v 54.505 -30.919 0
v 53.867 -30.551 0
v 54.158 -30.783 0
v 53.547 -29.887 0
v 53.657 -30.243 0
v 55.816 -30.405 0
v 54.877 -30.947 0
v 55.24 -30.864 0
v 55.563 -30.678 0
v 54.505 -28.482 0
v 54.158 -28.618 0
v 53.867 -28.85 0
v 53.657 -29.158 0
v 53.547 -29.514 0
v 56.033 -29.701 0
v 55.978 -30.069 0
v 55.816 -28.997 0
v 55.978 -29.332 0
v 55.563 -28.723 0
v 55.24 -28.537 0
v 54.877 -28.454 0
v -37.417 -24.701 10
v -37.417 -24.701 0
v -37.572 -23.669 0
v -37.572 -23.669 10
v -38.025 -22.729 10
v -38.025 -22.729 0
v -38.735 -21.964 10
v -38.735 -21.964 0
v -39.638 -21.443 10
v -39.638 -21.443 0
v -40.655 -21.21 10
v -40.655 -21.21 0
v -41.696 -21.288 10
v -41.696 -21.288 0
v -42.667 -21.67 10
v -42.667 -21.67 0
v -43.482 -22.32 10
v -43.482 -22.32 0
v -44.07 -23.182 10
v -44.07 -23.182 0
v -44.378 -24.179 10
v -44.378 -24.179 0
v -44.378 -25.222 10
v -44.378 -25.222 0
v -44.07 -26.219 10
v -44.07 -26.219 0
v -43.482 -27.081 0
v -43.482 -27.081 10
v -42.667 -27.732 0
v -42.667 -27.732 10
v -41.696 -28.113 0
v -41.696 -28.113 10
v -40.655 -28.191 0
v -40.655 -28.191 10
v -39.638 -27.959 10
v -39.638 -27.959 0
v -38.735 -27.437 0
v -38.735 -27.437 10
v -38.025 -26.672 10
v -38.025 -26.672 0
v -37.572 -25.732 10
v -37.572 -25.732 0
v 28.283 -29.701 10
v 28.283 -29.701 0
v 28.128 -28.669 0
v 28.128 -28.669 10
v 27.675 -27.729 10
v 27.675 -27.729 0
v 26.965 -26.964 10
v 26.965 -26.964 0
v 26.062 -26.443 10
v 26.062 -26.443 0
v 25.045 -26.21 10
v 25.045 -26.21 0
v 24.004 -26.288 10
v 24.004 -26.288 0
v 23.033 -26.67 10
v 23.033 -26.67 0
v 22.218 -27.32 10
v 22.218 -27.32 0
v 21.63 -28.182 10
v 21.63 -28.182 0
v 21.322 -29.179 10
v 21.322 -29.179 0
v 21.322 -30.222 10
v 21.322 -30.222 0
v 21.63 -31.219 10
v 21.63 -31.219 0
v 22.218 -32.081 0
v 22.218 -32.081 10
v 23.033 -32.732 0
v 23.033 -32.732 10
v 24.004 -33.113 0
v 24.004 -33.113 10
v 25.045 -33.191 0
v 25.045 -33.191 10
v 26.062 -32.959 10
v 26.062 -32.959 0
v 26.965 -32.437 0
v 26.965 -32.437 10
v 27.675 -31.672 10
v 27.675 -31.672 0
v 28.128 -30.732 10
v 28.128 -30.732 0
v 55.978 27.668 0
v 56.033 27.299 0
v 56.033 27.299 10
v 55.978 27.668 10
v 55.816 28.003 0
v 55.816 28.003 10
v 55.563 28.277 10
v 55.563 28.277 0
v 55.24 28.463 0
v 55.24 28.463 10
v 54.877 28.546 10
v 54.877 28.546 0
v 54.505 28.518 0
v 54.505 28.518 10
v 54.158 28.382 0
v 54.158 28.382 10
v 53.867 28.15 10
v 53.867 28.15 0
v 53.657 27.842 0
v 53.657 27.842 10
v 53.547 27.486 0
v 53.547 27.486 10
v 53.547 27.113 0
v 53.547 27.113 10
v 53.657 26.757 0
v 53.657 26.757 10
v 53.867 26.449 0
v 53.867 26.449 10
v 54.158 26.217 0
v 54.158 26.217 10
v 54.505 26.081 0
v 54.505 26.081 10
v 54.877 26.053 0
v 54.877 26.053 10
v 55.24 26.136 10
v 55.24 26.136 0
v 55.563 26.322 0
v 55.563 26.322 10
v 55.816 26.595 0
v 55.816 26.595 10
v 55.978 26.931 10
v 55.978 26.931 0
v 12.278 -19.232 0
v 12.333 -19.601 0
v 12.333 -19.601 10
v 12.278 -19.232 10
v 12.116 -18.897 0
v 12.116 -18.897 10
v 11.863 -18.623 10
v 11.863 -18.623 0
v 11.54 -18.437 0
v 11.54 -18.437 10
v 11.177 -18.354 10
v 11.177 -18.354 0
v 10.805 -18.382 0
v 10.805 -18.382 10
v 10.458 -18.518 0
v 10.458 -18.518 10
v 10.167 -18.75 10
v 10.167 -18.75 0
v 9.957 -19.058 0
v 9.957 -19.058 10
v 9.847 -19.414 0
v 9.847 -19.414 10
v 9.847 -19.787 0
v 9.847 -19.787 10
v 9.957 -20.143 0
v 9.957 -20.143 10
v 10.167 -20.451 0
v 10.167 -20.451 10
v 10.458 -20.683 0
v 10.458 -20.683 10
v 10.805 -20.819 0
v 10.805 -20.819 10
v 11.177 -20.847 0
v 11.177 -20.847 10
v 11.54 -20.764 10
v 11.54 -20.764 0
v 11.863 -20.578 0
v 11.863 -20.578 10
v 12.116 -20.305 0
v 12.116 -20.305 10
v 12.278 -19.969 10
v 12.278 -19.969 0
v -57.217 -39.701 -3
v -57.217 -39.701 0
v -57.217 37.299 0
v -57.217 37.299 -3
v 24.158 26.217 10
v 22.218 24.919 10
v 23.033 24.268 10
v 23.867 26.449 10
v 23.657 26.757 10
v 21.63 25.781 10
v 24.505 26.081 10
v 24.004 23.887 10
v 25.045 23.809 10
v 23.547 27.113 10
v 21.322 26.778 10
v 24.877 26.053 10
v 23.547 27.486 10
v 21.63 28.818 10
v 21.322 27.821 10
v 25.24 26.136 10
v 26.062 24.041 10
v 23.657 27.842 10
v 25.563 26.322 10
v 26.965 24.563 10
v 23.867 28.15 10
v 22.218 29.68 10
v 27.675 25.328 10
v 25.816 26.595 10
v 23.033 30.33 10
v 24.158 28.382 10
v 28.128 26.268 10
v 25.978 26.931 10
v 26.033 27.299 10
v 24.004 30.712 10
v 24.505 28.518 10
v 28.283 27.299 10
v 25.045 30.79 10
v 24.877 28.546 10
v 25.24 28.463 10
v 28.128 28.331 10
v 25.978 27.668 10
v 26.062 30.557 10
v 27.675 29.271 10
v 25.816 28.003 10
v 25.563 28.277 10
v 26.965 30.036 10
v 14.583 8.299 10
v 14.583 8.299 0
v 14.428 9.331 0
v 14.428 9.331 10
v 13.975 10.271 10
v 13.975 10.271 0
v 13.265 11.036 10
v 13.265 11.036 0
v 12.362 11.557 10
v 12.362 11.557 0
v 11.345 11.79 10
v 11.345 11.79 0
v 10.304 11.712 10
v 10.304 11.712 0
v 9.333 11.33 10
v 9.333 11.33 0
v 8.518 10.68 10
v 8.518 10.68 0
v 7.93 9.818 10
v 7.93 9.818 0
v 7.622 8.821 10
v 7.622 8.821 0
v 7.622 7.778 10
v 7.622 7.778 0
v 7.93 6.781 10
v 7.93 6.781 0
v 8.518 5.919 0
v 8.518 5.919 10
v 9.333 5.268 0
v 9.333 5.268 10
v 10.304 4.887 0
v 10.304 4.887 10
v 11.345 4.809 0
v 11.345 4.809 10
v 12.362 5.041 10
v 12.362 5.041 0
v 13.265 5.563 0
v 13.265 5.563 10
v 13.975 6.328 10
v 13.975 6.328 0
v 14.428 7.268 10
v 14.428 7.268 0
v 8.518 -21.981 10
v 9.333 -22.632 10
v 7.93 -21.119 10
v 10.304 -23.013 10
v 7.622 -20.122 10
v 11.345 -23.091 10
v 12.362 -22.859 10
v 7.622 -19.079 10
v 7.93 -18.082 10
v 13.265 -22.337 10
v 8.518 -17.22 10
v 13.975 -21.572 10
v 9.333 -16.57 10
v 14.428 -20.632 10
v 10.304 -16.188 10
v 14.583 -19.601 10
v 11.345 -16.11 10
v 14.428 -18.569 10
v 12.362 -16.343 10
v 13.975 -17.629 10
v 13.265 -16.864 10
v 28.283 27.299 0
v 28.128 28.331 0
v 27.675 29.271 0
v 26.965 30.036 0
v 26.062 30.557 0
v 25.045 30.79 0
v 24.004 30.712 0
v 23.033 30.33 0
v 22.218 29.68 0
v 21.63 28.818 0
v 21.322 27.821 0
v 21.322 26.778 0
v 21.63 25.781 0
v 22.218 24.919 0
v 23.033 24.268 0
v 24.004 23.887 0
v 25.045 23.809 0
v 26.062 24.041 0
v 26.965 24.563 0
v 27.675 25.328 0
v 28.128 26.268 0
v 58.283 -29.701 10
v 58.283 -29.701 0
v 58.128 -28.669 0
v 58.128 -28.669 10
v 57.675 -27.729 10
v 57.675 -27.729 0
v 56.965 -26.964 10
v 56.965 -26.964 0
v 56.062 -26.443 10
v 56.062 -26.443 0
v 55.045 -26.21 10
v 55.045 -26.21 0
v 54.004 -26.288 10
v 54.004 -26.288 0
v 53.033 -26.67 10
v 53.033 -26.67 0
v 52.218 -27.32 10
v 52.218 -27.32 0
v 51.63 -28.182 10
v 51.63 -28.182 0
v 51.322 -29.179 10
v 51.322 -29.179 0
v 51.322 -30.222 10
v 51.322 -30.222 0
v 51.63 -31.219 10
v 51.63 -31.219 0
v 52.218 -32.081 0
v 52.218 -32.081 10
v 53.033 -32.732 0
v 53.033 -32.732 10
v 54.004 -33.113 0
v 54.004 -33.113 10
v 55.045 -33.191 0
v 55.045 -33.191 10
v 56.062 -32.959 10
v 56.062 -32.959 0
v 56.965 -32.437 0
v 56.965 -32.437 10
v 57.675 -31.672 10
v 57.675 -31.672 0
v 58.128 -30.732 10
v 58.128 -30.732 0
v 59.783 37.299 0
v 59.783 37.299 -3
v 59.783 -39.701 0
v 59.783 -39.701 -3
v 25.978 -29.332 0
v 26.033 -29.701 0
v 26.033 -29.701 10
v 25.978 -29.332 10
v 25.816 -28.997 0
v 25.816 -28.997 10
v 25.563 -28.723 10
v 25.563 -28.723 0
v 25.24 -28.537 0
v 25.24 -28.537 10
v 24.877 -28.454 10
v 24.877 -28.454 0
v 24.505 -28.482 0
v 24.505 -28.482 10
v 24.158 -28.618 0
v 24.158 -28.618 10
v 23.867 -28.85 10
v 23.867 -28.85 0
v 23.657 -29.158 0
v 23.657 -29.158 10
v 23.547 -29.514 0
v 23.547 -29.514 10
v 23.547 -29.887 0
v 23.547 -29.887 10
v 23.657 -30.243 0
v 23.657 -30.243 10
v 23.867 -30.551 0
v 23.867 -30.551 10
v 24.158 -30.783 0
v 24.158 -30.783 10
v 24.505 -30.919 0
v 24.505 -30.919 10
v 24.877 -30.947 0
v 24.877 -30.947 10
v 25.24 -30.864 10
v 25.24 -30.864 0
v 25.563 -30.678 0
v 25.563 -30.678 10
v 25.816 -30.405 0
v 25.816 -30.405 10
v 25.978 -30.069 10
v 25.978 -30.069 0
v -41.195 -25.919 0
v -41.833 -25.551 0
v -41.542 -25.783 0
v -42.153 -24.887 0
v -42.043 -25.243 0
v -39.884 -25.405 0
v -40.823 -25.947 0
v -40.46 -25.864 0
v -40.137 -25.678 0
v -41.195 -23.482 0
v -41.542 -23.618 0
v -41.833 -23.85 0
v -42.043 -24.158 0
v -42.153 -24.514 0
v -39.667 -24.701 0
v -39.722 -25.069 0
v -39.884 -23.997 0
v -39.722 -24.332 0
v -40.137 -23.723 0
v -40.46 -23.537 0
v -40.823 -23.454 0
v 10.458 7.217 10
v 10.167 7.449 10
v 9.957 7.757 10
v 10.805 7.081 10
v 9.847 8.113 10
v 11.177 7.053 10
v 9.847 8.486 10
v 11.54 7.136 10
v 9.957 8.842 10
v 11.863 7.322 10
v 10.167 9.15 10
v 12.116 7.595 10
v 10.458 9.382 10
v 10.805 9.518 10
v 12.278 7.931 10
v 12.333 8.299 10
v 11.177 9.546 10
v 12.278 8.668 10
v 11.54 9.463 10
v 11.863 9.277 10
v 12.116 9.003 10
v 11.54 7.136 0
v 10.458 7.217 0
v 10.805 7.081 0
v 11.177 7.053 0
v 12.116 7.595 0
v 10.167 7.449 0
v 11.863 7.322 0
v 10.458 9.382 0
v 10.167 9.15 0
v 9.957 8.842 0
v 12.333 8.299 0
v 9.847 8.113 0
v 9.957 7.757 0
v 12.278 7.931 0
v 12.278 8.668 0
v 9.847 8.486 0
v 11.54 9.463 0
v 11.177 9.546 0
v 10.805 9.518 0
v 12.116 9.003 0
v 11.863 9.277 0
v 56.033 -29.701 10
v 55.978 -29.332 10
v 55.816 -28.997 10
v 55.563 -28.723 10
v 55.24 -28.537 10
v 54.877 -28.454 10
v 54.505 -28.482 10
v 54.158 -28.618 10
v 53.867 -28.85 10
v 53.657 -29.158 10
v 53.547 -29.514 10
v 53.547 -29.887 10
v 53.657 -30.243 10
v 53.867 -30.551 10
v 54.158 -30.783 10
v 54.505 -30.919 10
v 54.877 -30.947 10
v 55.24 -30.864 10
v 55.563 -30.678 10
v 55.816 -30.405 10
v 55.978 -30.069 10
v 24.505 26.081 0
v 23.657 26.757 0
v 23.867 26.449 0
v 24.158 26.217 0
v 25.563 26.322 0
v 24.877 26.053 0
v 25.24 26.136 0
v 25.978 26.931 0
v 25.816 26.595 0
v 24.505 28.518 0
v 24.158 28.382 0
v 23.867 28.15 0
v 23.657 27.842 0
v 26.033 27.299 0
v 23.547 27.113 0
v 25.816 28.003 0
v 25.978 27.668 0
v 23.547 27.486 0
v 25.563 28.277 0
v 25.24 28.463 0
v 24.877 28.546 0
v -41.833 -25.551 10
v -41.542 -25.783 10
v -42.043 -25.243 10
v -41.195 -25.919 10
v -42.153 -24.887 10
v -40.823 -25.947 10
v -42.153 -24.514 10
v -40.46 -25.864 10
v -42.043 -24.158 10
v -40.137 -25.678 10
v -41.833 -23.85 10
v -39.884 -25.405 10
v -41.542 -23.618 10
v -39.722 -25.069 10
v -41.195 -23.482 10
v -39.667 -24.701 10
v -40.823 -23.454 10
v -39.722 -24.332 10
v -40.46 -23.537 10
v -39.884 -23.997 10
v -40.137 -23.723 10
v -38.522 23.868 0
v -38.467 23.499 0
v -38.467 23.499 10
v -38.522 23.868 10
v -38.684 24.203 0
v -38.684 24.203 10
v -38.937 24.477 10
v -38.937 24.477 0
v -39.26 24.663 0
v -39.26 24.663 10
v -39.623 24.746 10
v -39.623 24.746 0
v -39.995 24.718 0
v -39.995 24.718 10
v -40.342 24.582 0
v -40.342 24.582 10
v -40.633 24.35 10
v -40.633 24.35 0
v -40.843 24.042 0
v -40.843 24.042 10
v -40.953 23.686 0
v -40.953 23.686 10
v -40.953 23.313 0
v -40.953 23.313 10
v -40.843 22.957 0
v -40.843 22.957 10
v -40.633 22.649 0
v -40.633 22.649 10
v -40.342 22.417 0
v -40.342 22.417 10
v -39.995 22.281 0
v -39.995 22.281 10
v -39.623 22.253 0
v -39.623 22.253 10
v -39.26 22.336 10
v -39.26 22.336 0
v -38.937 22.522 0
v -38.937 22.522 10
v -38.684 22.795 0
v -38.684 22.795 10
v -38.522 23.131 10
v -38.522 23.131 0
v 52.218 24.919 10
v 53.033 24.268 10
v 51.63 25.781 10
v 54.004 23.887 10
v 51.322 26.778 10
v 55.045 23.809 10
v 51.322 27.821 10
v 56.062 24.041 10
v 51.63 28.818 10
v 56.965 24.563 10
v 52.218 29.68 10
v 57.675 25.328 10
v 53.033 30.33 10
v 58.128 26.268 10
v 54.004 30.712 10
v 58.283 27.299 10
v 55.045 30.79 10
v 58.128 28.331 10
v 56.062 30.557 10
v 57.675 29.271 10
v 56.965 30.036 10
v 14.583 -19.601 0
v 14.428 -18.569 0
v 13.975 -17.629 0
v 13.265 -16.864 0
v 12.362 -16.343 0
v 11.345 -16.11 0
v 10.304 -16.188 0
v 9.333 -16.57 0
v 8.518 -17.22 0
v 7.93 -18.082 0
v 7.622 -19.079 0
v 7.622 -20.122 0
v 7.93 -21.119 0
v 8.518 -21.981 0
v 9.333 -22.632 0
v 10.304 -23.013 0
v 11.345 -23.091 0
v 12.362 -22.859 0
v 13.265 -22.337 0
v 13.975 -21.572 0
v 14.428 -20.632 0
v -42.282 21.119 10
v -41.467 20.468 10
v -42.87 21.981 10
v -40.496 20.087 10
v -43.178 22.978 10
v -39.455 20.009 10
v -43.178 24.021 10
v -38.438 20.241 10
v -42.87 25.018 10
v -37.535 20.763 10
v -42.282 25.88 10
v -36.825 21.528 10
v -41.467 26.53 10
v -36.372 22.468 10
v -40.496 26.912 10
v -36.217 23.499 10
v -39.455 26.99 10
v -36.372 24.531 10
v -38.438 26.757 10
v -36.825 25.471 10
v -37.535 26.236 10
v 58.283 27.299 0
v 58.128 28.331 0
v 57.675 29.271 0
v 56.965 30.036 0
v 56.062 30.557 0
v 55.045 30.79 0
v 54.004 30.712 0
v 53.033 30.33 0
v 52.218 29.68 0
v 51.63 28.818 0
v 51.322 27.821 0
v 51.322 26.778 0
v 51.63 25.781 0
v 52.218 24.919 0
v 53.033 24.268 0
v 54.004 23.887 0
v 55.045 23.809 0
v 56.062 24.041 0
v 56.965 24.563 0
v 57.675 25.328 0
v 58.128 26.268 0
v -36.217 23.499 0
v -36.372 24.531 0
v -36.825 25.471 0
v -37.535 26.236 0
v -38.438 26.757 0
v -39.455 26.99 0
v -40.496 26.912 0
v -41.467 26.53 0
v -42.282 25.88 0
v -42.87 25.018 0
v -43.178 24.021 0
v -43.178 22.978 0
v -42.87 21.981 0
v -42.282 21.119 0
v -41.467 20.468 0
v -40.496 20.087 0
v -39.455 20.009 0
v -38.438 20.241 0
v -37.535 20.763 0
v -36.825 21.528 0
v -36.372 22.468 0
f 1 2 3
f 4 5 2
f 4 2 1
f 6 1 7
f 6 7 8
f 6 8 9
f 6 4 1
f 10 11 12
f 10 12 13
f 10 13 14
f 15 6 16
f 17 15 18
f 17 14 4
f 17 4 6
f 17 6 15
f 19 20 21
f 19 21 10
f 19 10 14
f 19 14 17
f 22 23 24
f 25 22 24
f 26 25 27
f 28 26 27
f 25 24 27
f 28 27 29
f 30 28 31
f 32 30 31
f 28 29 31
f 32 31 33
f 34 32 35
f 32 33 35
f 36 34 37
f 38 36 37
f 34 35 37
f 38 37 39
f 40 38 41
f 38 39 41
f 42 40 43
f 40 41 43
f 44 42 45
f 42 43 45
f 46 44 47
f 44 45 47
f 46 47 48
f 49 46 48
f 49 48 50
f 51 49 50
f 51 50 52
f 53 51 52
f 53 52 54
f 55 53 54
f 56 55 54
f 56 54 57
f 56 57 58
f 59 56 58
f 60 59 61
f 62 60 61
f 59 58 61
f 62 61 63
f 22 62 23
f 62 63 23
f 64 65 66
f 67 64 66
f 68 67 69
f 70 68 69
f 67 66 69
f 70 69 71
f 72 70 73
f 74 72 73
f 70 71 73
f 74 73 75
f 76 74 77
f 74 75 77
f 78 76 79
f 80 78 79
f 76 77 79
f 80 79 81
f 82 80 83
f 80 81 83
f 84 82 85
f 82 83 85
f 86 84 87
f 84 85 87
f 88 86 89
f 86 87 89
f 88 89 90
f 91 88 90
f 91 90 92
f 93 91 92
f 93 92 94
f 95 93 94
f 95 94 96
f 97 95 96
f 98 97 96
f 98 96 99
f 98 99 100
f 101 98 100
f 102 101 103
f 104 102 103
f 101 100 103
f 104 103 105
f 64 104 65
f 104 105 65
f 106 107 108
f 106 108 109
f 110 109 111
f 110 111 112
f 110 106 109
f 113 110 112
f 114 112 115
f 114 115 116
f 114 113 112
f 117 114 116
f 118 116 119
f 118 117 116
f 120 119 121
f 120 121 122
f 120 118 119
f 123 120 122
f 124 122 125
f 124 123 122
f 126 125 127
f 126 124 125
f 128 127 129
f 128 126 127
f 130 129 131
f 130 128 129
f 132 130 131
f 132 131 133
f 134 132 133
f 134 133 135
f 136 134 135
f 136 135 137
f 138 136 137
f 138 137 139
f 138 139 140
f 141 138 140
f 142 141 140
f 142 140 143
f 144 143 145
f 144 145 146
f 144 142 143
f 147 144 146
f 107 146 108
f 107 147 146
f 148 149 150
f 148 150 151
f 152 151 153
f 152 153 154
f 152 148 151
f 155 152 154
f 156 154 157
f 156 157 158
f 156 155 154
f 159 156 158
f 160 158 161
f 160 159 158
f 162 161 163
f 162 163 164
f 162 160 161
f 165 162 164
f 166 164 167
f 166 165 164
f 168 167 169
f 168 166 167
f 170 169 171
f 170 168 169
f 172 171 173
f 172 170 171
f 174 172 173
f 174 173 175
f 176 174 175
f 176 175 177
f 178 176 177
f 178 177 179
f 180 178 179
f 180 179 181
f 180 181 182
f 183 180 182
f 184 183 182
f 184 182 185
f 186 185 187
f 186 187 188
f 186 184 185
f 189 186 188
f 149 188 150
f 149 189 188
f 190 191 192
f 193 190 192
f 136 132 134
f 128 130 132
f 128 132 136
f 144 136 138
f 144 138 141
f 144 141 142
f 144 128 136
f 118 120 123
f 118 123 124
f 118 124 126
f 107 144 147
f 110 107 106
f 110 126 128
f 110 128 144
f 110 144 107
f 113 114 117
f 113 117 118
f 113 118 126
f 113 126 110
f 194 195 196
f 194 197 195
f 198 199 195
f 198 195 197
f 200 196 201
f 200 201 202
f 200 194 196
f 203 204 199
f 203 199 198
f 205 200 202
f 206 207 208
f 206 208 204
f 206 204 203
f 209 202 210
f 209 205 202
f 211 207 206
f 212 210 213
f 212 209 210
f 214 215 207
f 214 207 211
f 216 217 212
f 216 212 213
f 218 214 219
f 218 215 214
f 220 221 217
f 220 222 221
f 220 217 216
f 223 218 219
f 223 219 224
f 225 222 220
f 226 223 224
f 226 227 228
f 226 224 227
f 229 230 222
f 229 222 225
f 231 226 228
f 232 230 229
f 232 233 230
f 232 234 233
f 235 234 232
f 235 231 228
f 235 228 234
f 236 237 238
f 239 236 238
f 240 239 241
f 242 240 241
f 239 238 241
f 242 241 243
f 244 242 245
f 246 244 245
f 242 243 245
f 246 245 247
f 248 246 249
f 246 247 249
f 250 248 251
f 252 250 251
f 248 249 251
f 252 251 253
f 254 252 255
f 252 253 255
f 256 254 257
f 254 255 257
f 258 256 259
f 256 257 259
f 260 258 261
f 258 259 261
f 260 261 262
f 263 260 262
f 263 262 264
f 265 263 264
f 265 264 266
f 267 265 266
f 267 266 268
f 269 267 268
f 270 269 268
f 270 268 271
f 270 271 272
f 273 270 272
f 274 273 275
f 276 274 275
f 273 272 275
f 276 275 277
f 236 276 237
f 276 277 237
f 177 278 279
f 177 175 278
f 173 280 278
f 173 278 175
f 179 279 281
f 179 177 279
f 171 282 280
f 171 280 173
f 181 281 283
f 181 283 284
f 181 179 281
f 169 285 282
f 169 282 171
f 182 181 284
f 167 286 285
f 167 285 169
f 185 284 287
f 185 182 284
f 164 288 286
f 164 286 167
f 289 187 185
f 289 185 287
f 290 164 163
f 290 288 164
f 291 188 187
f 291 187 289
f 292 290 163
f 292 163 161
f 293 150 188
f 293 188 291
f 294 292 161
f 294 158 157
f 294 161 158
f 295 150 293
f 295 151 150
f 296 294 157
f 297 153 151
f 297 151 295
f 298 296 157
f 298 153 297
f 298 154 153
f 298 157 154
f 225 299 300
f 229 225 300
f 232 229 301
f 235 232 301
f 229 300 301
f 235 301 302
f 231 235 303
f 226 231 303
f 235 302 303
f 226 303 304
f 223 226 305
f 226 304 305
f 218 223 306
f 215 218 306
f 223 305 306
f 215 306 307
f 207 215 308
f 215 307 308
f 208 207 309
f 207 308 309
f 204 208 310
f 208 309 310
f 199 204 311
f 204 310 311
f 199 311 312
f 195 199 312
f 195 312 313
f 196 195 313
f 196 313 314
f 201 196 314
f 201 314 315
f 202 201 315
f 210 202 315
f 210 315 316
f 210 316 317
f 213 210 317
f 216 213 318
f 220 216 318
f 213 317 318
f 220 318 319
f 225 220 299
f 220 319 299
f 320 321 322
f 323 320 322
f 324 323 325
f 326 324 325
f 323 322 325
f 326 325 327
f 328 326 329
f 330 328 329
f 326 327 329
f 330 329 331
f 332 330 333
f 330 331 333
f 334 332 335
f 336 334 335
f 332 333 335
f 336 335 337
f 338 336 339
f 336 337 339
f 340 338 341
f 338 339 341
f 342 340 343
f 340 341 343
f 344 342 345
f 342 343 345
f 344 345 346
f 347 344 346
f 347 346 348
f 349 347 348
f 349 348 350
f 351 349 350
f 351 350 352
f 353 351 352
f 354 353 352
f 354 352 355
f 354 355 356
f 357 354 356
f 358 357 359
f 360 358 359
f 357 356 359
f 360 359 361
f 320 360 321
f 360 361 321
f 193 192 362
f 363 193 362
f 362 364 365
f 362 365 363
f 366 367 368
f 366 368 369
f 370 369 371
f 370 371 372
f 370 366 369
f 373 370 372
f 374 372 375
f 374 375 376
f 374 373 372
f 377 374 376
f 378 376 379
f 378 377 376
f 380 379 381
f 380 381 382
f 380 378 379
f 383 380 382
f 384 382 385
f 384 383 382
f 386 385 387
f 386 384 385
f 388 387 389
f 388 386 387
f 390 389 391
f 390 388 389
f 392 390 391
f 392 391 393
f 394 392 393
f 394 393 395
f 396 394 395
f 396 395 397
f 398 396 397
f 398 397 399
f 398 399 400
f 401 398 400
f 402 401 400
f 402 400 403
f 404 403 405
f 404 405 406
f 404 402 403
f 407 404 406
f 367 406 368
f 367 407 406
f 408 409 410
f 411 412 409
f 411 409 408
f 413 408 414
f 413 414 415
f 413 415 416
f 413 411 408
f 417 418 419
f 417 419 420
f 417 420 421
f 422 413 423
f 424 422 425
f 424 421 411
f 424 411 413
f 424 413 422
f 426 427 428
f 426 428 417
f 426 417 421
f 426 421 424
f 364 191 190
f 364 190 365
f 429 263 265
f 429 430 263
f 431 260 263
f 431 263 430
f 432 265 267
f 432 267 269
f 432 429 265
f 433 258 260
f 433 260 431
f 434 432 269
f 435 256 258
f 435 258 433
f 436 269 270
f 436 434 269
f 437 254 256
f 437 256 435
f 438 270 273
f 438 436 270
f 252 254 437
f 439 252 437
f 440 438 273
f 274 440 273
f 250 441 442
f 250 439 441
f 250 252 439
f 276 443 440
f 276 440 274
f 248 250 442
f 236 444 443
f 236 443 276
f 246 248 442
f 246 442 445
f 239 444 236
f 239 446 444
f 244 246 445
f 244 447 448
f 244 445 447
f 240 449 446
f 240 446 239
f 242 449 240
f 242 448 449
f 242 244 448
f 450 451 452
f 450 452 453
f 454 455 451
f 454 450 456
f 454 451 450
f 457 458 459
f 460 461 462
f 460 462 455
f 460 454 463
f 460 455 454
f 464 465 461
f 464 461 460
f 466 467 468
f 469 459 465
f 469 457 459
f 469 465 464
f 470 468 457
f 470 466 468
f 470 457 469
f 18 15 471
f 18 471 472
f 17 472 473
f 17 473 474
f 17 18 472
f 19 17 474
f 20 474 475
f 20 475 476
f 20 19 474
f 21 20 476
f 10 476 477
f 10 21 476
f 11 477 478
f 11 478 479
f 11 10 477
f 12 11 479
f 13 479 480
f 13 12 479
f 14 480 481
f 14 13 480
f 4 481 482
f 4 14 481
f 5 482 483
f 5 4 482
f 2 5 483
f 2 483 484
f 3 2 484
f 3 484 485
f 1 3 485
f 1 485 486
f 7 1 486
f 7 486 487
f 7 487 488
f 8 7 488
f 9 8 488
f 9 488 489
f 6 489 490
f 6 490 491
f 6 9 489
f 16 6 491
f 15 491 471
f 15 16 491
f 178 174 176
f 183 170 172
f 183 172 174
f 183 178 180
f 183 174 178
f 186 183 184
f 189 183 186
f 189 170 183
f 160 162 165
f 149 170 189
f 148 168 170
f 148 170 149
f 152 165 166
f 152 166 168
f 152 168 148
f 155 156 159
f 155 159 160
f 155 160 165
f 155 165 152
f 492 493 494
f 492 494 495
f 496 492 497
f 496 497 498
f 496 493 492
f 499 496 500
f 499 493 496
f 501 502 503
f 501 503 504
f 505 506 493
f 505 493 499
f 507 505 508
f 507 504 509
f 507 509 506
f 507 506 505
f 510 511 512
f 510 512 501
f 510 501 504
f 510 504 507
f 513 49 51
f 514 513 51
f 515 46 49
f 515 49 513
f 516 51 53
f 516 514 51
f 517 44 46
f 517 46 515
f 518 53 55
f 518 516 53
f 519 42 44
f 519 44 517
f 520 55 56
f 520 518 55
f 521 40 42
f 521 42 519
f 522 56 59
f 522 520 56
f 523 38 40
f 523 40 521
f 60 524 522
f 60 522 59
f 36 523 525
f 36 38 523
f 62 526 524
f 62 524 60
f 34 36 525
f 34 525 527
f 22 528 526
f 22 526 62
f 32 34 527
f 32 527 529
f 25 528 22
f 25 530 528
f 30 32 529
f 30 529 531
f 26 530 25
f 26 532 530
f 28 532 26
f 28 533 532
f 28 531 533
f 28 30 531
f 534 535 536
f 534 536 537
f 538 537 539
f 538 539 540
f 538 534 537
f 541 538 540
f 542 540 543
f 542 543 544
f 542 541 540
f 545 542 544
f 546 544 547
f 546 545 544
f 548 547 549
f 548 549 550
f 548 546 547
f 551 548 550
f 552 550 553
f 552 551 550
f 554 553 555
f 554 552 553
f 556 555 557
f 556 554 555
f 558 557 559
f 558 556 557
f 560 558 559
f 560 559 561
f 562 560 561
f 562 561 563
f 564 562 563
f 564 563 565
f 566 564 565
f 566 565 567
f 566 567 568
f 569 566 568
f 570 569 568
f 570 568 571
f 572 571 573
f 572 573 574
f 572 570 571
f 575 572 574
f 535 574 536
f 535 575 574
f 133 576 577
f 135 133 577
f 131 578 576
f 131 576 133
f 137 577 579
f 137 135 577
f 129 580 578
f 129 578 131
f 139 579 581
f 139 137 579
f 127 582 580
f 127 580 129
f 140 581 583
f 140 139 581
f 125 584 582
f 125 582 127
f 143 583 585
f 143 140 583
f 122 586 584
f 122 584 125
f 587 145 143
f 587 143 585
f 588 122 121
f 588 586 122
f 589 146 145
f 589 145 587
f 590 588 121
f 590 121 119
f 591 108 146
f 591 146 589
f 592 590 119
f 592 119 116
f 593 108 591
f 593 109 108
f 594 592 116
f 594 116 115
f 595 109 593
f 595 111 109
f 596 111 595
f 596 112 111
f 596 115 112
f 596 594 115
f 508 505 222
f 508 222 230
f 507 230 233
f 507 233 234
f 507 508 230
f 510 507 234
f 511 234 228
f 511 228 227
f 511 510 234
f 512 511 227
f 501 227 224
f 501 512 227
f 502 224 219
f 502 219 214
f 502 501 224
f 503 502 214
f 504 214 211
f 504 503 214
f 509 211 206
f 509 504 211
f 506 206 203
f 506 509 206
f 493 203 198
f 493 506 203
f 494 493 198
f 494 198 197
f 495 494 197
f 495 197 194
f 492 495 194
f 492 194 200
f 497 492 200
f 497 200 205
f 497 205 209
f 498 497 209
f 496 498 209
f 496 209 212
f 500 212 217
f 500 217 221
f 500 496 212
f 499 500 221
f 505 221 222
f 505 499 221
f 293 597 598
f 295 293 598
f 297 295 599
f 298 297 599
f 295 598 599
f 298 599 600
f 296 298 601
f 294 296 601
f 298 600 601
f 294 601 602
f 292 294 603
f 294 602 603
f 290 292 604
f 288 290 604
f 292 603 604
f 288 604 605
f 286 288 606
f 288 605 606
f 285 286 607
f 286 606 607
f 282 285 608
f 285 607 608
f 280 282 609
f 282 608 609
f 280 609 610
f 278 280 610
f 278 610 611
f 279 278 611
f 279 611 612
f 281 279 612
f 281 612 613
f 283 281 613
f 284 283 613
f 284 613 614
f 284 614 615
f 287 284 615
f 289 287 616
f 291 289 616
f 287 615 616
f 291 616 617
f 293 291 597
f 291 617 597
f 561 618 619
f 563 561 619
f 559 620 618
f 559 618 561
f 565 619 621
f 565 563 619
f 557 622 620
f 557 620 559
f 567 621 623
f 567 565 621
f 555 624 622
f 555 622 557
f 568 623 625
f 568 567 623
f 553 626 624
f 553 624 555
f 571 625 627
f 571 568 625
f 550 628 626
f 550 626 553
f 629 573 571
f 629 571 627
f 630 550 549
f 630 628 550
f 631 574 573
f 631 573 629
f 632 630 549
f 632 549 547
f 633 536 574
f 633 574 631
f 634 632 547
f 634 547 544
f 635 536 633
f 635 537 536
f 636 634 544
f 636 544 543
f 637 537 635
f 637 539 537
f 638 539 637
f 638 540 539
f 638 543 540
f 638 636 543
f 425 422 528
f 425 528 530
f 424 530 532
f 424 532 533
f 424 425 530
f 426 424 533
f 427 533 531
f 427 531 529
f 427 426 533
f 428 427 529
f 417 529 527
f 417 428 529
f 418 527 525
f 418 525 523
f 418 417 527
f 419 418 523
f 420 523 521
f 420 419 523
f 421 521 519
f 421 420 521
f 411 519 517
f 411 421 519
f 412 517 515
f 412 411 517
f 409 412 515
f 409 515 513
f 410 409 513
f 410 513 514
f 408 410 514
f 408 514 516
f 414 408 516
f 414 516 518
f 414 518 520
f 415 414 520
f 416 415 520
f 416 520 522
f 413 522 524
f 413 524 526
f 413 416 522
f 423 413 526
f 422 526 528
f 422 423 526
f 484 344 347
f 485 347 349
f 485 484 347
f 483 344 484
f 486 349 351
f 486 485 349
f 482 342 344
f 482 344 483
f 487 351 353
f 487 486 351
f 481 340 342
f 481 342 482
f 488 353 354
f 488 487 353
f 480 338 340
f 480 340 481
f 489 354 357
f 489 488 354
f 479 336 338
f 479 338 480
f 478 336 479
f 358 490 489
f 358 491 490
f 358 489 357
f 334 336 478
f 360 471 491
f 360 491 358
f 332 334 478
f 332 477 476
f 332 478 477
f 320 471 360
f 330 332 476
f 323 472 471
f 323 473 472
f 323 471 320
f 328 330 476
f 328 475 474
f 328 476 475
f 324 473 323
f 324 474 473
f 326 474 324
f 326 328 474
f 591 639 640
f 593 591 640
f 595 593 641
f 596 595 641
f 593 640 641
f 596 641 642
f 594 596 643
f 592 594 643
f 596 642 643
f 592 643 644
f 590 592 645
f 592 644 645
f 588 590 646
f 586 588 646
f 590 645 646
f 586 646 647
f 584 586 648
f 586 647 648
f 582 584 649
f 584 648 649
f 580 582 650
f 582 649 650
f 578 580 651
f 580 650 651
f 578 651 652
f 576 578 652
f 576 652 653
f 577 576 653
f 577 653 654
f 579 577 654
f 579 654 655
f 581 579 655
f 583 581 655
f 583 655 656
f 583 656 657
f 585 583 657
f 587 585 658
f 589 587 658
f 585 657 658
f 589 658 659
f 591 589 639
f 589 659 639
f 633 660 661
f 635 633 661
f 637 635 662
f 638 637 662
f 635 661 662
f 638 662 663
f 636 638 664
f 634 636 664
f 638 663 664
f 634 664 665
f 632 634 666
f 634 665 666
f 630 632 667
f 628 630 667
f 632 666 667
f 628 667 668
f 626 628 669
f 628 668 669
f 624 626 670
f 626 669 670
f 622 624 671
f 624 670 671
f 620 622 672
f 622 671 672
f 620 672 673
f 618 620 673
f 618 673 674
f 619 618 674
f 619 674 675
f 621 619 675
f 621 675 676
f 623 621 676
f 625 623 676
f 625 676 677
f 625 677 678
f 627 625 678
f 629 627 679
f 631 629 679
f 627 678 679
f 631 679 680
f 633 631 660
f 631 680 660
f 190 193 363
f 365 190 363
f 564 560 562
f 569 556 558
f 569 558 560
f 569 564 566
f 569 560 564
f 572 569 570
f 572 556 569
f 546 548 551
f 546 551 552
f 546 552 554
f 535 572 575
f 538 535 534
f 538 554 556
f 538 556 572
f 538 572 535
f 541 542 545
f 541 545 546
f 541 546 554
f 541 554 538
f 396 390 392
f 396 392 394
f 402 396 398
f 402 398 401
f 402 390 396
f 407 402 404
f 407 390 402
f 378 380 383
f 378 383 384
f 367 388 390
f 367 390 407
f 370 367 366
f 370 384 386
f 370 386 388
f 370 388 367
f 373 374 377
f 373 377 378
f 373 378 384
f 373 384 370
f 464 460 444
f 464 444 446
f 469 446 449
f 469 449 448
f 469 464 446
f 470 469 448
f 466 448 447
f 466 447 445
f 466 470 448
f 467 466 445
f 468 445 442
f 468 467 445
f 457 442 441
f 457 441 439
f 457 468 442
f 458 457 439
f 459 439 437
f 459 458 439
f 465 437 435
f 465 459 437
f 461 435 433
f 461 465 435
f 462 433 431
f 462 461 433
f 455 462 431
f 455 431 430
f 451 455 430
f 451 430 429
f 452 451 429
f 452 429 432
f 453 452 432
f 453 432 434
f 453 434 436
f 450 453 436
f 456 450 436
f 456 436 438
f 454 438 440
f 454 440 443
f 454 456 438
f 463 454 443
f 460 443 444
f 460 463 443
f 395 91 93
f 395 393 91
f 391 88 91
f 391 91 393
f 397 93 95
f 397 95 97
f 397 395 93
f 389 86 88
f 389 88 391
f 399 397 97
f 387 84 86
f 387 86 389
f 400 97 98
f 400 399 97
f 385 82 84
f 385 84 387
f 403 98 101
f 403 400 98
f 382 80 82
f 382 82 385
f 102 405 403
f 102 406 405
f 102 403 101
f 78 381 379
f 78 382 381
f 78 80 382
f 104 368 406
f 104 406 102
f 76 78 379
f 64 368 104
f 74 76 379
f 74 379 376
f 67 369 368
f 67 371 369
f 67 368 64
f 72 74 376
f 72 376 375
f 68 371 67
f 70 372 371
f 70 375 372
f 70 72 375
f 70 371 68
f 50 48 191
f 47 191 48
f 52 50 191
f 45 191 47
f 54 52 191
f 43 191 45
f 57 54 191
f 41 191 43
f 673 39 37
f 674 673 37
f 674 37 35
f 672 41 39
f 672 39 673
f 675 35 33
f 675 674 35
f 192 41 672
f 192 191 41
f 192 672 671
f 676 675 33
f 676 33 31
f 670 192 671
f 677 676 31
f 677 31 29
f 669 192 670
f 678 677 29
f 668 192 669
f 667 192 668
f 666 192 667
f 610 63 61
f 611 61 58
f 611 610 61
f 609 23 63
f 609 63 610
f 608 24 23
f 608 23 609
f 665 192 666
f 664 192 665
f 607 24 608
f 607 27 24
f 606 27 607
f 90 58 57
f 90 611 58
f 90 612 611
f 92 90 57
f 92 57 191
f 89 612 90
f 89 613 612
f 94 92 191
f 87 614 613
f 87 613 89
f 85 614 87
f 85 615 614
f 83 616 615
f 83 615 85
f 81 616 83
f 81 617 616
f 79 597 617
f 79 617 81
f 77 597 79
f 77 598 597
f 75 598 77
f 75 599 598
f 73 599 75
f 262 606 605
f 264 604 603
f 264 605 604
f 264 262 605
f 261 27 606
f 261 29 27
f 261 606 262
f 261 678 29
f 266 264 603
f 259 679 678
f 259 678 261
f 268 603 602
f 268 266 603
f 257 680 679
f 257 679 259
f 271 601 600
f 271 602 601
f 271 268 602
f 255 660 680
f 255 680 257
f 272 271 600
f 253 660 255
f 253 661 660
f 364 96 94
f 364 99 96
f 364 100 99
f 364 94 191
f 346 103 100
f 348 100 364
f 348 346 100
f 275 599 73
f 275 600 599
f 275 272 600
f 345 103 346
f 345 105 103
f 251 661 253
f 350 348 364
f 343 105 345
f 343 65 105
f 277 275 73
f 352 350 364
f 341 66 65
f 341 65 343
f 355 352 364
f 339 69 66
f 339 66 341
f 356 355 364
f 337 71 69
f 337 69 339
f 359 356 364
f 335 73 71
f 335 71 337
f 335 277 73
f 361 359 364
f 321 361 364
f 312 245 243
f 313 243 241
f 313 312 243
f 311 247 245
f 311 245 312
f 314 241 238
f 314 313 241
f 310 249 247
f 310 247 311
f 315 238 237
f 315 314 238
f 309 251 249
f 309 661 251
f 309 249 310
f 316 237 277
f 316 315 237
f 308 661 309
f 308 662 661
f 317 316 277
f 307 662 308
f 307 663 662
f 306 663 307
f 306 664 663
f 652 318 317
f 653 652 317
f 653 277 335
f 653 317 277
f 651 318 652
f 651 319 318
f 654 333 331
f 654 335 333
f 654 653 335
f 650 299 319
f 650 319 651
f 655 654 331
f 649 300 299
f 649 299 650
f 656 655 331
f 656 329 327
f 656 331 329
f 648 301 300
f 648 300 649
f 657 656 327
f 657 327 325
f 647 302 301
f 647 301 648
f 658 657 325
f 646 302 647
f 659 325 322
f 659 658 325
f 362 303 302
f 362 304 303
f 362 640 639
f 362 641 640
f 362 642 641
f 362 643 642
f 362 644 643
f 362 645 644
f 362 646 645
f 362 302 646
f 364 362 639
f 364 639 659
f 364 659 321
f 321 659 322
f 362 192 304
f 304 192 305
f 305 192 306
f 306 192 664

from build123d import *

# Parameters (mm, degrees)
F0_W     = 117
F0_H     = 77
F0_R     = 3.5
F0_R_2   = 1.25
F1_DEPTH = 3
F2_DEPTH = 10


with BuildPart() as f1:
    # F0 (on Top) → F1 (new body)
    with BuildSketch(Plane.XY):
        with Locations((1.2832747996, -1.2006596088)):
            Rectangle(F0_W, F0_H)
        with Locations((-40.9167252004, -24.7006596088)):
            Circle(F0_R, mode=Mode.SUBTRACT)
        with Locations((24.7832747996, -29.7006596088)):
            Circle(F0_R, mode=Mode.SUBTRACT)
        with Locations((54.7832747996, -29.7006596088)):
            Circle(F0_R, mode=Mode.SUBTRACT)
        with Locations((11.0832747996, -19.6006596088)):
            Circle(F0_R, mode=Mode.SUBTRACT)
        with Locations((-39.7167252004, 23.4993403912)):
            Circle(F0_R, mode=Mode.SUBTRACT)
        with Locations((11.0832747996, 8.2993403912)):
            Circle(F0_R, mode=Mode.SUBTRACT)
        with Locations((24.7832747996, 27.2993403912)):
            Circle(F0_R, mode=Mode.SUBTRACT)
        with Locations((54.7832747996, 27.2993403912)):
            Circle(F0_R, mode=Mode.SUBTRACT)
        with Locations((-39.7167252004, 23.4993403912)):
            Circle(F0_R)
        with Locations((-39.7167252004, 23.4993403912)):
            Circle(F0_R_2, mode=Mode.SUBTRACT)
        with Locations((11.0832747996, 8.2993403912)):
            Circle(F0_R)
        with Locations((11.0832747996, 8.2993403912)):
            Circle(F0_R_2, mode=Mode.SUBTRACT)
        with Locations((11.0832747996, -19.6006596088)):
            Circle(F0_R)
        with Locations((11.0832747996, -19.6006596088)):
            Circle(F0_R_2, mode=Mode.SUBTRACT)
        with Locations((-40.9167252004, -24.7006596088)):
            Circle(F0_R)
        with Locations((-40.9167252004, -24.7006596088)):
            Circle(F0_R_2, mode=Mode.SUBTRACT)
        with Locations((24.7832747996, 27.2993403912)):
            Circle(F0_R)
        with Locations((24.7832747996, 27.2993403912)):
            Circle(F0_R_2, mode=Mode.SUBTRACT)
        with Locations((54.7832747996, 27.2993403912)):
            Circle(F0_R)
        with Locations((54.7832747996, 27.2993403912)):
            Circle(F0_R_2, mode=Mode.SUBTRACT)
        with Locations((54.7832747996, -29.7006596088)):
            Circle(F0_R)
        with Locations((54.7832747996, -29.7006596088)):
            Circle(F0_R_2, mode=Mode.SUBTRACT)
        with Locations((24.7832747996, -29.7006596088)):
            Circle(F0_R)
        with Locations((24.7832747996, -29.7006596088)):
            Circle(F0_R_2, mode=Mode.SUBTRACT)
        with Locations((11.0832747996, 8.2993403912)):
            Circle(F0_R_2)
        with Locations((11.0832747996, -19.6006596088)):
            Circle(F0_R_2)
        with Locations((-40.9167252004, -24.7006596088)):
            Circle(F0_R_2)
        with Locations((-39.7167252004, 23.4993403912)):
            Circle(F0_R_2)
        with Locations((24.7832747996, 27.2993403912)):
            Circle(F0_R_2)
        with Locations((54.7832747996, 27.2993403912)):
            Circle(F0_R_2)
        with Locations((54.7832747996, -29.7006596088)):
            Circle(F0_R_2)
        with Locations((24.7832747996, -29.7006596088)):
            Circle(F0_R_2)
    extrude(amount=-F1_DEPTH)

    # F0 (on Top) → F2 (join)
    with BuildSketch(Plane.XY):
        with Locations((-39.7167252004, 23.4993403912)):
            Circle(F0_R)
        with Locations((-39.7167252004, 23.4993403912)):
            Circle(F0_R_2, mode=Mode.SUBTRACT)
        with Locations((11.0832747996, 8.2993403912)):
            Circle(F0_R)
        with Locations((11.0832747996, 8.2993403912)):
            Circle(F0_R_2, mode=Mode.SUBTRACT)
        with Locations((11.0832747996, -19.6006596088)):
            Circle(F0_R)
        with Locations((11.0832747996, -19.6006596088)):
            Circle(F0_R_2, mode=Mode.SUBTRACT)
        with Locations((-40.9167252004, -24.7006596088)):
            Circle(F0_R)
        with Locations((-40.9167252004, -24.7006596088)):
            Circle(F0_R_2, mode=Mode.SUBTRACT)
        with Locations((24.7832747996, -29.7006596088)):
            Circle(F0_R)
        with Locations((24.7832747996, -29.7006596088)):
            Circle(F0_R_2, mode=Mode.SUBTRACT)
        with Locations((54.7832747996, -29.7006596088)):
            Circle(F0_R)
        with Locations((54.7832747996, -29.7006596088)):
            Circle(F0_R_2, mode=Mode.SUBTRACT)
        with Locations((24.7832747996, 27.2993403912)):
            Circle(F0_R)
        with Locations((24.7832747996, 27.2993403912)):
            Circle(F0_R_2, mode=Mode.SUBTRACT)
        with Locations((54.7832747996, 27.2993403912)):
            Circle(F0_R)
        with Locations((54.7832747996, 27.2993403912)):
            Circle(F0_R_2, mode=Mode.SUBTRACT)
    extrude(amount=F2_DEPTH)


solid = f1.part
